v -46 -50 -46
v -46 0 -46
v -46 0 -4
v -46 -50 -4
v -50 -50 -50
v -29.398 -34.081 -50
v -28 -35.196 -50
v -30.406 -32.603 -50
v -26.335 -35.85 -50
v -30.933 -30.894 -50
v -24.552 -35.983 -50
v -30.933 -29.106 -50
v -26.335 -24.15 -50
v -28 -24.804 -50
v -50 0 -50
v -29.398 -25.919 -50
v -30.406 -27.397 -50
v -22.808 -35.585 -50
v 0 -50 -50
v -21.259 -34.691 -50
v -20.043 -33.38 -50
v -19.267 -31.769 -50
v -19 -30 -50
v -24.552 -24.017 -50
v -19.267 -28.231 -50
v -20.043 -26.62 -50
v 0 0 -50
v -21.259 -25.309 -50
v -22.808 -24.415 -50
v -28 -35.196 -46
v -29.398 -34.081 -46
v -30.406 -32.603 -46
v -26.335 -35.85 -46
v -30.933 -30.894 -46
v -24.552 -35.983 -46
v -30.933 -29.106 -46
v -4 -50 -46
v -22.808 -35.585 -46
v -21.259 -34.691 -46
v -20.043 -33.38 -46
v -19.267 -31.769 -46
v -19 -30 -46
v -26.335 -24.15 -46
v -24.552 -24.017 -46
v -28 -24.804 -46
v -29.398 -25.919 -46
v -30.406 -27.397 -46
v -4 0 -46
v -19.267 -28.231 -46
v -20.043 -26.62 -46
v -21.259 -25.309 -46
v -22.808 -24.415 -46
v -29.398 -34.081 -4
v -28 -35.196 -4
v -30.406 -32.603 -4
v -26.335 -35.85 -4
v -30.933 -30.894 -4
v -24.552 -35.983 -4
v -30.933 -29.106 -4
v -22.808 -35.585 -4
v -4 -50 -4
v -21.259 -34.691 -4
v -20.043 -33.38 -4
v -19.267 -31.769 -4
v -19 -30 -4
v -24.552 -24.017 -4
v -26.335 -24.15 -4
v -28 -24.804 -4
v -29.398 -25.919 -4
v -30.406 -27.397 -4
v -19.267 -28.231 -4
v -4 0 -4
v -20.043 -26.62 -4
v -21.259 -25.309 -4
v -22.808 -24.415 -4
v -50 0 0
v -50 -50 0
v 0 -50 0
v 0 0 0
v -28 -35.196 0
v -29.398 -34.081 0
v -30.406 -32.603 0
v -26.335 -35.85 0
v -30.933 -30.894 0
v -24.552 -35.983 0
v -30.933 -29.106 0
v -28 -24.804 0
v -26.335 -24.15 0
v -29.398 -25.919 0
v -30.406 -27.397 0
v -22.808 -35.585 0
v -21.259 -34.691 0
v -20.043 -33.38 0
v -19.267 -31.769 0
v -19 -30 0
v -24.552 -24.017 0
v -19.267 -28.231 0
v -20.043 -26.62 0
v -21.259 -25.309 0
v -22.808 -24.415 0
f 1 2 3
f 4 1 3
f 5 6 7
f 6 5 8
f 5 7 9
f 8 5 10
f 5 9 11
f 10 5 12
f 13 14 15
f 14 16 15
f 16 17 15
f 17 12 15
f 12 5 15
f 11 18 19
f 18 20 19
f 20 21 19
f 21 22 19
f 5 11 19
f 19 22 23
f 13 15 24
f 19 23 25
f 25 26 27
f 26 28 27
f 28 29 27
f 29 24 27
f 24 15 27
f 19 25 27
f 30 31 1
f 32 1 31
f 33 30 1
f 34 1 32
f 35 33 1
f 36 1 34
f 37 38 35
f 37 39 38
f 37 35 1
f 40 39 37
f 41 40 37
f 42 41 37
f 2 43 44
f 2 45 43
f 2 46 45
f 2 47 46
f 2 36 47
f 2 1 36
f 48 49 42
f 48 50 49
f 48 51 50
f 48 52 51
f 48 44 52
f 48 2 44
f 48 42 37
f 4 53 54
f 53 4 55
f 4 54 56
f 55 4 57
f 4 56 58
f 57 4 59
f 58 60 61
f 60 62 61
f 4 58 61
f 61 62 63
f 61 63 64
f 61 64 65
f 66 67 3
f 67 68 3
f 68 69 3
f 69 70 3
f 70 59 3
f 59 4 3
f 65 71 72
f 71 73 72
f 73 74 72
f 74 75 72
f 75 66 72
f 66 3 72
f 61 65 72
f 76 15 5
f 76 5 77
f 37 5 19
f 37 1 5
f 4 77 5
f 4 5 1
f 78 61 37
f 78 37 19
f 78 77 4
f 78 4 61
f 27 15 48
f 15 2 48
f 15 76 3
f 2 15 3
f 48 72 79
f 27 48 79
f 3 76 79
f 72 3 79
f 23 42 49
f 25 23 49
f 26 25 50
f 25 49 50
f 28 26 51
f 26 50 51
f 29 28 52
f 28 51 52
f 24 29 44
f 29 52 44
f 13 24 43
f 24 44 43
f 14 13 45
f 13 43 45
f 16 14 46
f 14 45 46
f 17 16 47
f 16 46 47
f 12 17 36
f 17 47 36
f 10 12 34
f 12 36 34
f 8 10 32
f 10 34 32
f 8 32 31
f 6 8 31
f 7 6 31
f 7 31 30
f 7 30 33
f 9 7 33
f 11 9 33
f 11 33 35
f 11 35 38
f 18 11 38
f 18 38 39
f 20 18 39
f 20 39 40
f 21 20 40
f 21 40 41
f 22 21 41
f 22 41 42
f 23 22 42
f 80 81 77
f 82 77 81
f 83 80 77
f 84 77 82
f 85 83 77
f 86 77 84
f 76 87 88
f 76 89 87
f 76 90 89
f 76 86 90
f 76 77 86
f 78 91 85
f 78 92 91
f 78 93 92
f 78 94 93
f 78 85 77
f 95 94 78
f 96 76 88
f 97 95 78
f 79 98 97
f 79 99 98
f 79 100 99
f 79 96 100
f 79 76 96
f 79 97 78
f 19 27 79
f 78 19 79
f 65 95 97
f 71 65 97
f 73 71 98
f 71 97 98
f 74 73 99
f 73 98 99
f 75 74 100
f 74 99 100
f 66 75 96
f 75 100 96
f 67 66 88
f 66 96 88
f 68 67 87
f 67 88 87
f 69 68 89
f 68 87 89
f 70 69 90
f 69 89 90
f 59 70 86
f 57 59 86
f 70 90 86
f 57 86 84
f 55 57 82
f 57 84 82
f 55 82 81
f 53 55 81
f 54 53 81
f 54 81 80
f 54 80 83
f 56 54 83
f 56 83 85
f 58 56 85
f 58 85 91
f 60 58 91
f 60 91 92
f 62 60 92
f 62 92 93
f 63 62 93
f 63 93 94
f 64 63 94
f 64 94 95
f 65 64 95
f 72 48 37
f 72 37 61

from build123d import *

# Parameters (mm, degrees)
F0_W     = 50
F0_H     = 50
F0_W_2   = 42
F0_H_2   = 42
F1_DEPTH = 50
F2_R     = 6
F3_DEPTH = 50.001


with BuildPart() as f1:
    # F0 (on Front) → F1 (new body)
    with BuildSketch(Plane.XZ):
        with Locations((-25, -25)):
            Rectangle(F0_W, F0_H)
        with Locations((-25, -25)):
            Rectangle(F0_W_2, F0_H_2, mode=Mode.SUBTRACT)
    extrude(amount=F1_DEPTH)

    # F2 (on face) → F3 (cut, through all)
    with BuildSketch(Plane.XY):
        with Locations((-25, -30)):
            Circle(F2_R)
    extrude(amount=-F3_DEPTH, mode=Mode.SUBTRACT)


solid = f1.part
